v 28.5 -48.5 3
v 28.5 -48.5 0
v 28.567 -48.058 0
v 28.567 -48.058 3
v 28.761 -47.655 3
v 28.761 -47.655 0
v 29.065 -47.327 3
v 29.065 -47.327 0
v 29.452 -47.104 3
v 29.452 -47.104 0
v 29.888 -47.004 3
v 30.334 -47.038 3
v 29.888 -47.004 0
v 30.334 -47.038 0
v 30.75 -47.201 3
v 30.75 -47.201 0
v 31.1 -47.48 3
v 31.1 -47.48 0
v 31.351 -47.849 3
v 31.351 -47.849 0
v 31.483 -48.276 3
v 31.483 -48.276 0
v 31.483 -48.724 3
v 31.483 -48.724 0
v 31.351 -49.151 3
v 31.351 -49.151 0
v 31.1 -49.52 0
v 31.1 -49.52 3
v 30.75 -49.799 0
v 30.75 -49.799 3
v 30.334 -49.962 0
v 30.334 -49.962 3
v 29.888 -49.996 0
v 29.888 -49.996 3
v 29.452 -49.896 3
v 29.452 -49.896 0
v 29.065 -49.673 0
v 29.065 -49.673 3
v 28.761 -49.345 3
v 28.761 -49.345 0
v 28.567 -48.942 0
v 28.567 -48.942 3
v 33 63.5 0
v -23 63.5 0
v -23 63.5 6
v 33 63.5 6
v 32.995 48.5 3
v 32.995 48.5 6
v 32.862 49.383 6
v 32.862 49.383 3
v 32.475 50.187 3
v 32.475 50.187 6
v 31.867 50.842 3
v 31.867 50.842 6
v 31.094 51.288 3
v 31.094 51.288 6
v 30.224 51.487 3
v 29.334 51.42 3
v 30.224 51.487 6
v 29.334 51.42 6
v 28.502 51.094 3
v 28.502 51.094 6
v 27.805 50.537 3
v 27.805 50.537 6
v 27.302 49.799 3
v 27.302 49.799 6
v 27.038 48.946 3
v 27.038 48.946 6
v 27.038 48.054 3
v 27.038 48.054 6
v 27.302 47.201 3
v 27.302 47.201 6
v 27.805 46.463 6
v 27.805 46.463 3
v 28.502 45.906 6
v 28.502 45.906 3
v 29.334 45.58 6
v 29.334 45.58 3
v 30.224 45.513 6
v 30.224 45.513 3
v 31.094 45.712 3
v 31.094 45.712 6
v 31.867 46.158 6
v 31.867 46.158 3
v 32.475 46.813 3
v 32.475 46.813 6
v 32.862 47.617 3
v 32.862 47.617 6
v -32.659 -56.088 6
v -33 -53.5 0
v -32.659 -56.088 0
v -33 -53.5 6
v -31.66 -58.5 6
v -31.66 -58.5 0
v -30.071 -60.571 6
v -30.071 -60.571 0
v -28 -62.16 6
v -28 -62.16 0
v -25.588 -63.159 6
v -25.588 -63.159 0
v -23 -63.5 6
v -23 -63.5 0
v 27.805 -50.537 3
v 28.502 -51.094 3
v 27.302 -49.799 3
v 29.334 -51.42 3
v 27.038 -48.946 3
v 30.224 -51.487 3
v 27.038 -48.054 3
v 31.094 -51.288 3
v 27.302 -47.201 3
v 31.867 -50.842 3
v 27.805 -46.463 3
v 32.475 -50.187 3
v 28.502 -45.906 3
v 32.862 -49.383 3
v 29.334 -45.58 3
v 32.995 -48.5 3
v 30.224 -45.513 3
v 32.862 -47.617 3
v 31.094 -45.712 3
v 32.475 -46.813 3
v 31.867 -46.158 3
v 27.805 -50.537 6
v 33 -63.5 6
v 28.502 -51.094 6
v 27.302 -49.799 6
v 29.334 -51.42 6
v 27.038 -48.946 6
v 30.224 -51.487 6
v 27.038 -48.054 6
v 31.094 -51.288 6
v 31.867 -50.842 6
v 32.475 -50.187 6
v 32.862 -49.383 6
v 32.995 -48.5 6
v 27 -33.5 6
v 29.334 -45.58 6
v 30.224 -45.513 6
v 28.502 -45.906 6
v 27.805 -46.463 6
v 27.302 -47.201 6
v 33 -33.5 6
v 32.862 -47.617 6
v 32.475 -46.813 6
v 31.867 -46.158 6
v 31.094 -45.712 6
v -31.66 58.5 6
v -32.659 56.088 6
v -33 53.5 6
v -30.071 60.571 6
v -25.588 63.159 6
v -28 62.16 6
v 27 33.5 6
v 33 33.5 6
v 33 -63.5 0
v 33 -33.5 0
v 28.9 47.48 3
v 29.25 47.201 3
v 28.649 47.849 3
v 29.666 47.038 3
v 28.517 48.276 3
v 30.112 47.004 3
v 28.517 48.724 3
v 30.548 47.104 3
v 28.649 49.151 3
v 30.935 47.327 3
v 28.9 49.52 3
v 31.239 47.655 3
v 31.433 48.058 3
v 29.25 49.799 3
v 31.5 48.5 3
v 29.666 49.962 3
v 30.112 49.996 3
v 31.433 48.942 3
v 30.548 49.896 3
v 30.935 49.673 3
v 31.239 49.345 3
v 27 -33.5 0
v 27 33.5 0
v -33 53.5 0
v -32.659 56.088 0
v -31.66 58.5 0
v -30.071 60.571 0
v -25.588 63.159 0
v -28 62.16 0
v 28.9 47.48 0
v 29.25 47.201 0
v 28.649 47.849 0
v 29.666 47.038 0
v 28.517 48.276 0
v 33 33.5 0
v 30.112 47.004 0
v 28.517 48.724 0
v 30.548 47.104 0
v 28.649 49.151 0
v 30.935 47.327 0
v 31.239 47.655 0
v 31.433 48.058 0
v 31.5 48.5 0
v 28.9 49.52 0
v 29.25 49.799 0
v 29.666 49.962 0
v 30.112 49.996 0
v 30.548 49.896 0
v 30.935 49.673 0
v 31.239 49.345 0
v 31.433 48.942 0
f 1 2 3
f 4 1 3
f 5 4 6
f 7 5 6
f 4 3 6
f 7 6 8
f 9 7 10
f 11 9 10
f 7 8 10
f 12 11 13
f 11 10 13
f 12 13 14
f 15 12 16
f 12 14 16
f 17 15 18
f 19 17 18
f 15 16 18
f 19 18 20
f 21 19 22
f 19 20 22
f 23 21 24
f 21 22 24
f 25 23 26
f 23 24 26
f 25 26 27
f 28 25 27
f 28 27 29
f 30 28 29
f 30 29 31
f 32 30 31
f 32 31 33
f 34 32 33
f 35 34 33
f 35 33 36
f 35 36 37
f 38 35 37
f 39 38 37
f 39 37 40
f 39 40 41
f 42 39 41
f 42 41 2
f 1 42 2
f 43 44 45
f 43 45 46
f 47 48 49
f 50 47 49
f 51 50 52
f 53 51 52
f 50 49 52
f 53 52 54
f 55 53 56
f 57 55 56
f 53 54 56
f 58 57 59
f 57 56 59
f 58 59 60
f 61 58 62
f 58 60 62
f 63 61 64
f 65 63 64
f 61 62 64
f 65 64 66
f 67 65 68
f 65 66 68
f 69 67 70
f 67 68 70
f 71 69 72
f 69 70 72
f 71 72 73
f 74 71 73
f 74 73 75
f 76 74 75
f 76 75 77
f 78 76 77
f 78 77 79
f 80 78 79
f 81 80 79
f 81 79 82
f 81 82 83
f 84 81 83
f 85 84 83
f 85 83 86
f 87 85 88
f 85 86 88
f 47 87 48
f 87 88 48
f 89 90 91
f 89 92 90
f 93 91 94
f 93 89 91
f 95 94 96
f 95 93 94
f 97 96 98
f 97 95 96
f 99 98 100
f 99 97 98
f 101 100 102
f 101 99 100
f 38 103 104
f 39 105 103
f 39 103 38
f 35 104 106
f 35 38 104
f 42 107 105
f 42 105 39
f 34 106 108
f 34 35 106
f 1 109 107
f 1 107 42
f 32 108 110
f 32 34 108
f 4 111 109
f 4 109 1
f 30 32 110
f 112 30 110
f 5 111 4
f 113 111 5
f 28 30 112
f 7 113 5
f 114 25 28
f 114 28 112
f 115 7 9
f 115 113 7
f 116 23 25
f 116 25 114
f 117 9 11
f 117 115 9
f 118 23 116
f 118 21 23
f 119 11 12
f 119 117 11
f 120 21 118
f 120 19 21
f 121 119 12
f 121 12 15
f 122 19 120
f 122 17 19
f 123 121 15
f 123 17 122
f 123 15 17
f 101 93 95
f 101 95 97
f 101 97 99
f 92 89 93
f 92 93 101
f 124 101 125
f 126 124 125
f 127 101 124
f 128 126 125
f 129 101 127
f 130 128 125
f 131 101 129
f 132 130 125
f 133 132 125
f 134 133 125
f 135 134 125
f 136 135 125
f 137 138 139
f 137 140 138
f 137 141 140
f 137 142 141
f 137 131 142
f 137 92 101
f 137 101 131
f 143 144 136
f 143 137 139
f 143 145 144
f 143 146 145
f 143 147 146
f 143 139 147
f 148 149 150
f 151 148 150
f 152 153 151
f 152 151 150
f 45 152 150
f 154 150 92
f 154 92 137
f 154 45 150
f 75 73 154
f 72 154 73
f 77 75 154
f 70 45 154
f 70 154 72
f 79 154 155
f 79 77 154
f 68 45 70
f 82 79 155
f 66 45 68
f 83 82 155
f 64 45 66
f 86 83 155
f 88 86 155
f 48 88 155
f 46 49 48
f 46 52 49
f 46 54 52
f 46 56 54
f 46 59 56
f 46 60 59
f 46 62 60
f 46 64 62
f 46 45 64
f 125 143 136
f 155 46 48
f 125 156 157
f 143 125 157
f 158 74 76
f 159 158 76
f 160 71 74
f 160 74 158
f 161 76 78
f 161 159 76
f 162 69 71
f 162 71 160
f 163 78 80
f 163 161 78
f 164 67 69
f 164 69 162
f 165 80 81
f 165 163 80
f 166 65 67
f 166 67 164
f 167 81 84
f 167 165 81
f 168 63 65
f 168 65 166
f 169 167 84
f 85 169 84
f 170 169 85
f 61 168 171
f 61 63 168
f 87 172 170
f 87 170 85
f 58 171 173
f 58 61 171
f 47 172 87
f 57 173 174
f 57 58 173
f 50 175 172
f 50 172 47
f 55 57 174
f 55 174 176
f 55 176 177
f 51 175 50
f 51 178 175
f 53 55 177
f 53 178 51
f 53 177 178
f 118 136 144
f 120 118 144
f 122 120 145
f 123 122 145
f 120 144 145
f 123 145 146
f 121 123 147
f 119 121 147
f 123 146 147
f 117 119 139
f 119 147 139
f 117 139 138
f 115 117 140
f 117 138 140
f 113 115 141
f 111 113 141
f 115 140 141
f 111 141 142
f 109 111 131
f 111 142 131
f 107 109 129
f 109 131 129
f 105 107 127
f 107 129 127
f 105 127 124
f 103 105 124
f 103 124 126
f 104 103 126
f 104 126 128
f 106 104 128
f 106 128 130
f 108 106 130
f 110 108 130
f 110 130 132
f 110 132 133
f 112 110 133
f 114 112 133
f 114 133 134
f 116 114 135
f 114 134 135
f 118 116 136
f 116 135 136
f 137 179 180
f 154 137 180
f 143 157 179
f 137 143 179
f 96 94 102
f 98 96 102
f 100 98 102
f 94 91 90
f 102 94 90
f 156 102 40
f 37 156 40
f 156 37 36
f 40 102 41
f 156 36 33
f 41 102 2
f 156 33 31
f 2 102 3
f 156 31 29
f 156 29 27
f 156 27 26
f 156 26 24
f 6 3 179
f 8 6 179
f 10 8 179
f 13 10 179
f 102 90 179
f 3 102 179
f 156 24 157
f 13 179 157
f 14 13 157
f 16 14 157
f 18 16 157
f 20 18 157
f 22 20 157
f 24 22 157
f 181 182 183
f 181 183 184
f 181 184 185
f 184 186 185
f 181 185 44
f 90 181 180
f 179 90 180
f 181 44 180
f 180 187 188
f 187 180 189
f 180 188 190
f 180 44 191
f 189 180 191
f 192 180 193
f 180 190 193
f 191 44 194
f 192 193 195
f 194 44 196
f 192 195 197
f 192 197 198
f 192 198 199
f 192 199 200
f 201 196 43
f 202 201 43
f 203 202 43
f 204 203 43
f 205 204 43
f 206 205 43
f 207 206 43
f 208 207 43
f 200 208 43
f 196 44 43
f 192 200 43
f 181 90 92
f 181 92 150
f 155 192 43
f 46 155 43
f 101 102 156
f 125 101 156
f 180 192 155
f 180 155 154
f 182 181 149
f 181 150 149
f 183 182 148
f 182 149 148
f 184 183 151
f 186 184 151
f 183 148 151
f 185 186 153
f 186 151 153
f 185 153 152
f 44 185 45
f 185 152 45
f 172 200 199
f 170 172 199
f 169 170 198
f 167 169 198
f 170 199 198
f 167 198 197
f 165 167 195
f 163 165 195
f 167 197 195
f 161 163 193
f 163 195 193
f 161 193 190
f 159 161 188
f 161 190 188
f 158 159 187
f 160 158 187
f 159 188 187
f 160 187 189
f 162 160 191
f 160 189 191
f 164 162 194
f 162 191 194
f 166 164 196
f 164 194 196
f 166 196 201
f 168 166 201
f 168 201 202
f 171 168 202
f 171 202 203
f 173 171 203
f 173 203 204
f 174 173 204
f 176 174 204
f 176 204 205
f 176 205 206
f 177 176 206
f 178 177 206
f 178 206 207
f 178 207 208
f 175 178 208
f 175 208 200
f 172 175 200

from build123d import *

# Parameters (mm, degrees)
ESQUISSE1_W             = 66
ESQUISSE1_H             = 127
BOSS_EXTRU_1_DEPTH      = 6
CONG_1_R                = 10
ESQUISSE2_R             = 1.5
ESQUISSE2_W             = 6
ESQUISSE2_H             = 67
ENL_V_MAT_EXTRU_1_DEPTH = 72.81399585
ESQUISSE5_R             = 2.995
ENL_V_MAT_EXTRU_4_DEPTH = 3


with BuildPart() as part:
    # Esquisse1 → Boss.-Extru.1 (new body)
    with BuildSketch(Plane.XY):
        Rectangle(ESQUISSE1_W, ESQUISSE1_H)
    extrude(amount=BOSS_EXTRU_1_DEPTH)

    # Congé1
    cong_1_edges = [part.edges().sort_by_distance(p)[0] for p in [
        (-33, -63.5, 3),
        (-33, 63.5, 3),
    ]]
    fillet(cong_1_edges, radius=CONG_1_R)

    # Esquisse2 → Enlèv. mat.-Extru.1 (cut, through all)
    with BuildSketch(Plane(origin=(0, 0, 0), x_dir=(-1, 0, 0), z_dir=(0, 0, -1))):
        with Locations((-30, -48.5)):
            Circle(ESQUISSE2_R)
        with Locations(Location((-30, 48.5, 0), (0, 0, 180))):
            Circle(ESQUISSE2_R)
        with Locations((-30, 0)):
            Rectangle(ESQUISSE2_W, ESQUISSE2_H)
    extrude(amount=-ENL_V_MAT_EXTRU_1_DEPTH, mode=Mode.SUBTRACT)

    # Esquisse5 → Enlèv. mat.-Extru.4 (cut)
    with BuildSketch(Plane.XY.offset(6)):
        with Locations((30, 48.5)):
            Circle(ESQUISSE5_R)
        with Locations((30, -48.5)):
            Circle(ESQUISSE5_R)
    extrude(amount=-ENL_V_MAT_EXTRU_4_DEPTH, mode=Mode.SUBTRACT)


solid = part.part
